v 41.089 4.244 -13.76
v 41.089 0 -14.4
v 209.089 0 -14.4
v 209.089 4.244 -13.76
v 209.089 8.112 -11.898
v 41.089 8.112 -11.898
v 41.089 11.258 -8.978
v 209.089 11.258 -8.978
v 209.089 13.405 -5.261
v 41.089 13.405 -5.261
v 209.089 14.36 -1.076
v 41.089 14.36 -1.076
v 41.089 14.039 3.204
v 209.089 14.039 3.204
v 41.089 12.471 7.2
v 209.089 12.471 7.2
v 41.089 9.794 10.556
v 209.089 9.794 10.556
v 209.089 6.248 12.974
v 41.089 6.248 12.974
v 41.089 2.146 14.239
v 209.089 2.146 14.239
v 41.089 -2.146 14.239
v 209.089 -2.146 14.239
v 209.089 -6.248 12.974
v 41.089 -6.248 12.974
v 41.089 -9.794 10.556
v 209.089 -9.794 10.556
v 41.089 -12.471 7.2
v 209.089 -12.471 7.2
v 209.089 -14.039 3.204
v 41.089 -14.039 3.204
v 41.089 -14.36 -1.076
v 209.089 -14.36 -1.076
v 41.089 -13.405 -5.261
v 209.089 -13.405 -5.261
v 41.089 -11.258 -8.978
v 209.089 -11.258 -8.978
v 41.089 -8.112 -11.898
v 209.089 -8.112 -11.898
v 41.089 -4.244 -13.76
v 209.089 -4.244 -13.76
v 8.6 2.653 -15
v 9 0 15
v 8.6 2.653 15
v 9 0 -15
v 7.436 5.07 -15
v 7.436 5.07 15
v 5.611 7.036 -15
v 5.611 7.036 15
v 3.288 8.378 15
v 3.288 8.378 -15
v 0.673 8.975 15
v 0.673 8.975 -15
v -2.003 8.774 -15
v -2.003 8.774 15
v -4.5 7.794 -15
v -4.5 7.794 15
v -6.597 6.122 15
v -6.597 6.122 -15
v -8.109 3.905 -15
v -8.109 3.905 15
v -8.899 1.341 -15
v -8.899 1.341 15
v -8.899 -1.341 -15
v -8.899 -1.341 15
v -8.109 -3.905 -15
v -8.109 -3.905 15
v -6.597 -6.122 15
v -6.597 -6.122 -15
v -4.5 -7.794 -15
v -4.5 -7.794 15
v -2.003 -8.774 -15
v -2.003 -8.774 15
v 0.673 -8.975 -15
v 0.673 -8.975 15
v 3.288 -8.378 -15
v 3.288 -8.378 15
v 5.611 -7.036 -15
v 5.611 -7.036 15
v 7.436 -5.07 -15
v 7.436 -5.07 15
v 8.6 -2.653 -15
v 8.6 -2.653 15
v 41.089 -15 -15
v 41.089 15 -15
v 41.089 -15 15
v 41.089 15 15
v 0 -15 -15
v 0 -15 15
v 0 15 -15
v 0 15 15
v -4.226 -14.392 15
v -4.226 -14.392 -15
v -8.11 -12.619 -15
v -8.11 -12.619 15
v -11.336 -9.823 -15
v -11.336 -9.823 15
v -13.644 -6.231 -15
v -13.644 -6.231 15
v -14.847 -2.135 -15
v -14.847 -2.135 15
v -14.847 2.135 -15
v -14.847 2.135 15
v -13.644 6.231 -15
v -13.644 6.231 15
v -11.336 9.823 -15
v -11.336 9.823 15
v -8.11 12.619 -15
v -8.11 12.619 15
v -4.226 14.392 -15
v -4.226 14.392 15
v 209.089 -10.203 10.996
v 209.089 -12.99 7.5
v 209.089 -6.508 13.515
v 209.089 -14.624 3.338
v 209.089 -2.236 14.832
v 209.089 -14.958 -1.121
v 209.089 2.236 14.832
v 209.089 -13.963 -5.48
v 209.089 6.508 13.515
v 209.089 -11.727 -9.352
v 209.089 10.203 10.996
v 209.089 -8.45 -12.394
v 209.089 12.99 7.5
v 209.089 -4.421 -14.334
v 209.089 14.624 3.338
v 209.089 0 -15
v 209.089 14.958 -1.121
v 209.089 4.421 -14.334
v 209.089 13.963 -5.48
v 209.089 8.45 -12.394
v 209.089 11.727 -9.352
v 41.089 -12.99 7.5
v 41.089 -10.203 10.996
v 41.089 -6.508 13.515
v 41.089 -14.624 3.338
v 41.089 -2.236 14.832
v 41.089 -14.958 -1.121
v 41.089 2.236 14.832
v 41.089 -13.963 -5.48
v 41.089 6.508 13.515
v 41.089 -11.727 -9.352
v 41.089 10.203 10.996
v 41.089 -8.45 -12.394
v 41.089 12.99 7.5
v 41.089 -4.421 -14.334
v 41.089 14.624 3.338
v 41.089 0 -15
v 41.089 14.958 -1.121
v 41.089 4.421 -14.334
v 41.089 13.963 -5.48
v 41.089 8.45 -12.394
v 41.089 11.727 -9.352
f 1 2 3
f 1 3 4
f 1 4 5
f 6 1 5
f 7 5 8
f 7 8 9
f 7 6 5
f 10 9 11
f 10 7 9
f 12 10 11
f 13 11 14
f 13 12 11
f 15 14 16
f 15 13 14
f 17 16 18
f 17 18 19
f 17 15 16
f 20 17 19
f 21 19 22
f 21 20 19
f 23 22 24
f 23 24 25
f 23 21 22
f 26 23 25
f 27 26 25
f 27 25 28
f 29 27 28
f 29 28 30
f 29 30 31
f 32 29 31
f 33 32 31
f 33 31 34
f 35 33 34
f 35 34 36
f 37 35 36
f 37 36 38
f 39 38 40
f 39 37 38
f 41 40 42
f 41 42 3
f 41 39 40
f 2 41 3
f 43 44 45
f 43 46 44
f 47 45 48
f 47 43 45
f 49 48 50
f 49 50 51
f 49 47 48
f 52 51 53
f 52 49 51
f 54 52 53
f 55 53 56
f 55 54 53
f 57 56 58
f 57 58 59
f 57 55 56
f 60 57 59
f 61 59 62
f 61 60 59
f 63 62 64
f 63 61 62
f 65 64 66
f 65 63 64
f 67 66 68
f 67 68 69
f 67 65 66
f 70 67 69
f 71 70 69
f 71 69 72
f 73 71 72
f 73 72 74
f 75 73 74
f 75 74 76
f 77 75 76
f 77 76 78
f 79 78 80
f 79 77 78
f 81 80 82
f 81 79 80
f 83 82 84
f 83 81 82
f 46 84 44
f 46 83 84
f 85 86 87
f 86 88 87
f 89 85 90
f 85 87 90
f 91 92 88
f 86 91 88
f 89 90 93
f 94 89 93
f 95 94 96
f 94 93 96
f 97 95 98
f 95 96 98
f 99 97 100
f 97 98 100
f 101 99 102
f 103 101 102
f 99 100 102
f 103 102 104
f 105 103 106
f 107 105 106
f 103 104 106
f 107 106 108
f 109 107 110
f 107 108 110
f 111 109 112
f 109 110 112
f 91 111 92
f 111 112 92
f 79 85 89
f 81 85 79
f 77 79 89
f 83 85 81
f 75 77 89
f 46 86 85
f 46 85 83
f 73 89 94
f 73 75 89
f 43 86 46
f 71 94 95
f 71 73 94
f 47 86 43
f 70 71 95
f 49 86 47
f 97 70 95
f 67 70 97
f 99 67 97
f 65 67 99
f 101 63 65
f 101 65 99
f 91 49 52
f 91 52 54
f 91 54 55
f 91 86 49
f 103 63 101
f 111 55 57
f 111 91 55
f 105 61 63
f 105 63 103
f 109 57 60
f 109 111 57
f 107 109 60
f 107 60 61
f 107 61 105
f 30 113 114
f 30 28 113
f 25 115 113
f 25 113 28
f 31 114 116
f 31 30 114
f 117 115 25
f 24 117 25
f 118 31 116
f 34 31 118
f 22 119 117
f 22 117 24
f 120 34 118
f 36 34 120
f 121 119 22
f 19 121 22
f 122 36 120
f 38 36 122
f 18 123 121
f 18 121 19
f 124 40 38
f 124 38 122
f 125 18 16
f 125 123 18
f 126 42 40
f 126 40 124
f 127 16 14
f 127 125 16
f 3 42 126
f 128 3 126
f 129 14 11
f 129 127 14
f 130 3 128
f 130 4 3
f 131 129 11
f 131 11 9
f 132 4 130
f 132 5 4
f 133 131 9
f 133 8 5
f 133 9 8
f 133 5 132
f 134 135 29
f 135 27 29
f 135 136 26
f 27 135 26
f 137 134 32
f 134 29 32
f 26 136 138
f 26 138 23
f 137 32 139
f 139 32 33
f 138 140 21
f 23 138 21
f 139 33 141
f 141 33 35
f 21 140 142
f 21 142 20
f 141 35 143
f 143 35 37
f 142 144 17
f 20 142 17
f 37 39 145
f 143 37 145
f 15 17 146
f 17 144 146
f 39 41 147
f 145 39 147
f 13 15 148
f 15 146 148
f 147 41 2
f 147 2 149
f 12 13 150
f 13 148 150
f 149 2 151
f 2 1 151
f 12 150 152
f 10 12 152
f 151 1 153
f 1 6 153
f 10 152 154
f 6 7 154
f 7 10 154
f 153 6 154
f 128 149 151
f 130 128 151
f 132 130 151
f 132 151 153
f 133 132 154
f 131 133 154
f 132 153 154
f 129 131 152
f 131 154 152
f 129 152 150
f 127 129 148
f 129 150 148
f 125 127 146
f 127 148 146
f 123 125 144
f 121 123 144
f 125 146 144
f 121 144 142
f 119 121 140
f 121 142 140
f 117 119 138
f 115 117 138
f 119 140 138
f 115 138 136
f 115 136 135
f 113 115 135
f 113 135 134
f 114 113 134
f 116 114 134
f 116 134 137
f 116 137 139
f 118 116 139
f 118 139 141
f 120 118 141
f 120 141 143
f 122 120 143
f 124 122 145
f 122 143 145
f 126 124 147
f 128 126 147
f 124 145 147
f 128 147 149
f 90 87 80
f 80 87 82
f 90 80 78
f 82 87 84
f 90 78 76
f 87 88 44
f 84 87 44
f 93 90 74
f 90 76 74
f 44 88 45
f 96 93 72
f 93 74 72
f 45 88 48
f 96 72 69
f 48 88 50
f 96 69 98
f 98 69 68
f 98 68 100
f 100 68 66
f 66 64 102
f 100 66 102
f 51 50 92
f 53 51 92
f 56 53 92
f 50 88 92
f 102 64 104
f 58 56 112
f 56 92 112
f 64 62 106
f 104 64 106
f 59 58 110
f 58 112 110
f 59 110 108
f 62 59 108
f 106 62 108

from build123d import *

# Parameters (mm, degrees)
SKETCH_1_R      = 15
EXTRUDE_1_DEPTH = 25
SKETCH_2_R      = 25
SKETCH_2_R_2    = 24
EXTRUDE_2_DEPTH = 280
SCALE_1_SCALE   = 0.6


with BuildPart() as part:
    # 草图1 → 凸台-拉伸1 (new, symmetric)
    with BuildSketch(Plane.XY):
        with BuildLine():
            Line((0, 25), (68.482482698, 25))
            Line((68.482482698, 25), (68.482482698, -25))
            Line((68.482482698, -25), (0, -25))
            ThreePointArc((0, -25), (-25, 0), (0, 25))
        make_face()
        Circle(SKETCH_1_R, mode=Mode.SUBTRACT)
    extrude(amount=EXTRUDE_1_DEPTH, both=True)


with BuildPart() as body_2:
    # 草图2 → 凸台-拉伸2 (new body)
    with BuildSketch(Plane(origin=(68.482482698, 0, 0), x_dir=(0, 0, -1), z_dir=(1, 0, 0))):
        Circle(SKETCH_2_R)
        Circle(SKETCH_2_R_2, mode=Mode.SUBTRACT)
    extrude(amount=EXTRUDE_2_DEPTH)


with BuildPart() as part_1:
    # 缩放比例1: scaled about (0, 0, 0)
    add(part.part.scale(SCALE_1_SCALE))


with BuildPart() as body_2_1:
    # 缩放比例1: scaled about (0, 0, 0)
    add(body_2.part.scale(SCALE_1_SCALE))


solid = Compound([part_1.part, body_2_1.part])
